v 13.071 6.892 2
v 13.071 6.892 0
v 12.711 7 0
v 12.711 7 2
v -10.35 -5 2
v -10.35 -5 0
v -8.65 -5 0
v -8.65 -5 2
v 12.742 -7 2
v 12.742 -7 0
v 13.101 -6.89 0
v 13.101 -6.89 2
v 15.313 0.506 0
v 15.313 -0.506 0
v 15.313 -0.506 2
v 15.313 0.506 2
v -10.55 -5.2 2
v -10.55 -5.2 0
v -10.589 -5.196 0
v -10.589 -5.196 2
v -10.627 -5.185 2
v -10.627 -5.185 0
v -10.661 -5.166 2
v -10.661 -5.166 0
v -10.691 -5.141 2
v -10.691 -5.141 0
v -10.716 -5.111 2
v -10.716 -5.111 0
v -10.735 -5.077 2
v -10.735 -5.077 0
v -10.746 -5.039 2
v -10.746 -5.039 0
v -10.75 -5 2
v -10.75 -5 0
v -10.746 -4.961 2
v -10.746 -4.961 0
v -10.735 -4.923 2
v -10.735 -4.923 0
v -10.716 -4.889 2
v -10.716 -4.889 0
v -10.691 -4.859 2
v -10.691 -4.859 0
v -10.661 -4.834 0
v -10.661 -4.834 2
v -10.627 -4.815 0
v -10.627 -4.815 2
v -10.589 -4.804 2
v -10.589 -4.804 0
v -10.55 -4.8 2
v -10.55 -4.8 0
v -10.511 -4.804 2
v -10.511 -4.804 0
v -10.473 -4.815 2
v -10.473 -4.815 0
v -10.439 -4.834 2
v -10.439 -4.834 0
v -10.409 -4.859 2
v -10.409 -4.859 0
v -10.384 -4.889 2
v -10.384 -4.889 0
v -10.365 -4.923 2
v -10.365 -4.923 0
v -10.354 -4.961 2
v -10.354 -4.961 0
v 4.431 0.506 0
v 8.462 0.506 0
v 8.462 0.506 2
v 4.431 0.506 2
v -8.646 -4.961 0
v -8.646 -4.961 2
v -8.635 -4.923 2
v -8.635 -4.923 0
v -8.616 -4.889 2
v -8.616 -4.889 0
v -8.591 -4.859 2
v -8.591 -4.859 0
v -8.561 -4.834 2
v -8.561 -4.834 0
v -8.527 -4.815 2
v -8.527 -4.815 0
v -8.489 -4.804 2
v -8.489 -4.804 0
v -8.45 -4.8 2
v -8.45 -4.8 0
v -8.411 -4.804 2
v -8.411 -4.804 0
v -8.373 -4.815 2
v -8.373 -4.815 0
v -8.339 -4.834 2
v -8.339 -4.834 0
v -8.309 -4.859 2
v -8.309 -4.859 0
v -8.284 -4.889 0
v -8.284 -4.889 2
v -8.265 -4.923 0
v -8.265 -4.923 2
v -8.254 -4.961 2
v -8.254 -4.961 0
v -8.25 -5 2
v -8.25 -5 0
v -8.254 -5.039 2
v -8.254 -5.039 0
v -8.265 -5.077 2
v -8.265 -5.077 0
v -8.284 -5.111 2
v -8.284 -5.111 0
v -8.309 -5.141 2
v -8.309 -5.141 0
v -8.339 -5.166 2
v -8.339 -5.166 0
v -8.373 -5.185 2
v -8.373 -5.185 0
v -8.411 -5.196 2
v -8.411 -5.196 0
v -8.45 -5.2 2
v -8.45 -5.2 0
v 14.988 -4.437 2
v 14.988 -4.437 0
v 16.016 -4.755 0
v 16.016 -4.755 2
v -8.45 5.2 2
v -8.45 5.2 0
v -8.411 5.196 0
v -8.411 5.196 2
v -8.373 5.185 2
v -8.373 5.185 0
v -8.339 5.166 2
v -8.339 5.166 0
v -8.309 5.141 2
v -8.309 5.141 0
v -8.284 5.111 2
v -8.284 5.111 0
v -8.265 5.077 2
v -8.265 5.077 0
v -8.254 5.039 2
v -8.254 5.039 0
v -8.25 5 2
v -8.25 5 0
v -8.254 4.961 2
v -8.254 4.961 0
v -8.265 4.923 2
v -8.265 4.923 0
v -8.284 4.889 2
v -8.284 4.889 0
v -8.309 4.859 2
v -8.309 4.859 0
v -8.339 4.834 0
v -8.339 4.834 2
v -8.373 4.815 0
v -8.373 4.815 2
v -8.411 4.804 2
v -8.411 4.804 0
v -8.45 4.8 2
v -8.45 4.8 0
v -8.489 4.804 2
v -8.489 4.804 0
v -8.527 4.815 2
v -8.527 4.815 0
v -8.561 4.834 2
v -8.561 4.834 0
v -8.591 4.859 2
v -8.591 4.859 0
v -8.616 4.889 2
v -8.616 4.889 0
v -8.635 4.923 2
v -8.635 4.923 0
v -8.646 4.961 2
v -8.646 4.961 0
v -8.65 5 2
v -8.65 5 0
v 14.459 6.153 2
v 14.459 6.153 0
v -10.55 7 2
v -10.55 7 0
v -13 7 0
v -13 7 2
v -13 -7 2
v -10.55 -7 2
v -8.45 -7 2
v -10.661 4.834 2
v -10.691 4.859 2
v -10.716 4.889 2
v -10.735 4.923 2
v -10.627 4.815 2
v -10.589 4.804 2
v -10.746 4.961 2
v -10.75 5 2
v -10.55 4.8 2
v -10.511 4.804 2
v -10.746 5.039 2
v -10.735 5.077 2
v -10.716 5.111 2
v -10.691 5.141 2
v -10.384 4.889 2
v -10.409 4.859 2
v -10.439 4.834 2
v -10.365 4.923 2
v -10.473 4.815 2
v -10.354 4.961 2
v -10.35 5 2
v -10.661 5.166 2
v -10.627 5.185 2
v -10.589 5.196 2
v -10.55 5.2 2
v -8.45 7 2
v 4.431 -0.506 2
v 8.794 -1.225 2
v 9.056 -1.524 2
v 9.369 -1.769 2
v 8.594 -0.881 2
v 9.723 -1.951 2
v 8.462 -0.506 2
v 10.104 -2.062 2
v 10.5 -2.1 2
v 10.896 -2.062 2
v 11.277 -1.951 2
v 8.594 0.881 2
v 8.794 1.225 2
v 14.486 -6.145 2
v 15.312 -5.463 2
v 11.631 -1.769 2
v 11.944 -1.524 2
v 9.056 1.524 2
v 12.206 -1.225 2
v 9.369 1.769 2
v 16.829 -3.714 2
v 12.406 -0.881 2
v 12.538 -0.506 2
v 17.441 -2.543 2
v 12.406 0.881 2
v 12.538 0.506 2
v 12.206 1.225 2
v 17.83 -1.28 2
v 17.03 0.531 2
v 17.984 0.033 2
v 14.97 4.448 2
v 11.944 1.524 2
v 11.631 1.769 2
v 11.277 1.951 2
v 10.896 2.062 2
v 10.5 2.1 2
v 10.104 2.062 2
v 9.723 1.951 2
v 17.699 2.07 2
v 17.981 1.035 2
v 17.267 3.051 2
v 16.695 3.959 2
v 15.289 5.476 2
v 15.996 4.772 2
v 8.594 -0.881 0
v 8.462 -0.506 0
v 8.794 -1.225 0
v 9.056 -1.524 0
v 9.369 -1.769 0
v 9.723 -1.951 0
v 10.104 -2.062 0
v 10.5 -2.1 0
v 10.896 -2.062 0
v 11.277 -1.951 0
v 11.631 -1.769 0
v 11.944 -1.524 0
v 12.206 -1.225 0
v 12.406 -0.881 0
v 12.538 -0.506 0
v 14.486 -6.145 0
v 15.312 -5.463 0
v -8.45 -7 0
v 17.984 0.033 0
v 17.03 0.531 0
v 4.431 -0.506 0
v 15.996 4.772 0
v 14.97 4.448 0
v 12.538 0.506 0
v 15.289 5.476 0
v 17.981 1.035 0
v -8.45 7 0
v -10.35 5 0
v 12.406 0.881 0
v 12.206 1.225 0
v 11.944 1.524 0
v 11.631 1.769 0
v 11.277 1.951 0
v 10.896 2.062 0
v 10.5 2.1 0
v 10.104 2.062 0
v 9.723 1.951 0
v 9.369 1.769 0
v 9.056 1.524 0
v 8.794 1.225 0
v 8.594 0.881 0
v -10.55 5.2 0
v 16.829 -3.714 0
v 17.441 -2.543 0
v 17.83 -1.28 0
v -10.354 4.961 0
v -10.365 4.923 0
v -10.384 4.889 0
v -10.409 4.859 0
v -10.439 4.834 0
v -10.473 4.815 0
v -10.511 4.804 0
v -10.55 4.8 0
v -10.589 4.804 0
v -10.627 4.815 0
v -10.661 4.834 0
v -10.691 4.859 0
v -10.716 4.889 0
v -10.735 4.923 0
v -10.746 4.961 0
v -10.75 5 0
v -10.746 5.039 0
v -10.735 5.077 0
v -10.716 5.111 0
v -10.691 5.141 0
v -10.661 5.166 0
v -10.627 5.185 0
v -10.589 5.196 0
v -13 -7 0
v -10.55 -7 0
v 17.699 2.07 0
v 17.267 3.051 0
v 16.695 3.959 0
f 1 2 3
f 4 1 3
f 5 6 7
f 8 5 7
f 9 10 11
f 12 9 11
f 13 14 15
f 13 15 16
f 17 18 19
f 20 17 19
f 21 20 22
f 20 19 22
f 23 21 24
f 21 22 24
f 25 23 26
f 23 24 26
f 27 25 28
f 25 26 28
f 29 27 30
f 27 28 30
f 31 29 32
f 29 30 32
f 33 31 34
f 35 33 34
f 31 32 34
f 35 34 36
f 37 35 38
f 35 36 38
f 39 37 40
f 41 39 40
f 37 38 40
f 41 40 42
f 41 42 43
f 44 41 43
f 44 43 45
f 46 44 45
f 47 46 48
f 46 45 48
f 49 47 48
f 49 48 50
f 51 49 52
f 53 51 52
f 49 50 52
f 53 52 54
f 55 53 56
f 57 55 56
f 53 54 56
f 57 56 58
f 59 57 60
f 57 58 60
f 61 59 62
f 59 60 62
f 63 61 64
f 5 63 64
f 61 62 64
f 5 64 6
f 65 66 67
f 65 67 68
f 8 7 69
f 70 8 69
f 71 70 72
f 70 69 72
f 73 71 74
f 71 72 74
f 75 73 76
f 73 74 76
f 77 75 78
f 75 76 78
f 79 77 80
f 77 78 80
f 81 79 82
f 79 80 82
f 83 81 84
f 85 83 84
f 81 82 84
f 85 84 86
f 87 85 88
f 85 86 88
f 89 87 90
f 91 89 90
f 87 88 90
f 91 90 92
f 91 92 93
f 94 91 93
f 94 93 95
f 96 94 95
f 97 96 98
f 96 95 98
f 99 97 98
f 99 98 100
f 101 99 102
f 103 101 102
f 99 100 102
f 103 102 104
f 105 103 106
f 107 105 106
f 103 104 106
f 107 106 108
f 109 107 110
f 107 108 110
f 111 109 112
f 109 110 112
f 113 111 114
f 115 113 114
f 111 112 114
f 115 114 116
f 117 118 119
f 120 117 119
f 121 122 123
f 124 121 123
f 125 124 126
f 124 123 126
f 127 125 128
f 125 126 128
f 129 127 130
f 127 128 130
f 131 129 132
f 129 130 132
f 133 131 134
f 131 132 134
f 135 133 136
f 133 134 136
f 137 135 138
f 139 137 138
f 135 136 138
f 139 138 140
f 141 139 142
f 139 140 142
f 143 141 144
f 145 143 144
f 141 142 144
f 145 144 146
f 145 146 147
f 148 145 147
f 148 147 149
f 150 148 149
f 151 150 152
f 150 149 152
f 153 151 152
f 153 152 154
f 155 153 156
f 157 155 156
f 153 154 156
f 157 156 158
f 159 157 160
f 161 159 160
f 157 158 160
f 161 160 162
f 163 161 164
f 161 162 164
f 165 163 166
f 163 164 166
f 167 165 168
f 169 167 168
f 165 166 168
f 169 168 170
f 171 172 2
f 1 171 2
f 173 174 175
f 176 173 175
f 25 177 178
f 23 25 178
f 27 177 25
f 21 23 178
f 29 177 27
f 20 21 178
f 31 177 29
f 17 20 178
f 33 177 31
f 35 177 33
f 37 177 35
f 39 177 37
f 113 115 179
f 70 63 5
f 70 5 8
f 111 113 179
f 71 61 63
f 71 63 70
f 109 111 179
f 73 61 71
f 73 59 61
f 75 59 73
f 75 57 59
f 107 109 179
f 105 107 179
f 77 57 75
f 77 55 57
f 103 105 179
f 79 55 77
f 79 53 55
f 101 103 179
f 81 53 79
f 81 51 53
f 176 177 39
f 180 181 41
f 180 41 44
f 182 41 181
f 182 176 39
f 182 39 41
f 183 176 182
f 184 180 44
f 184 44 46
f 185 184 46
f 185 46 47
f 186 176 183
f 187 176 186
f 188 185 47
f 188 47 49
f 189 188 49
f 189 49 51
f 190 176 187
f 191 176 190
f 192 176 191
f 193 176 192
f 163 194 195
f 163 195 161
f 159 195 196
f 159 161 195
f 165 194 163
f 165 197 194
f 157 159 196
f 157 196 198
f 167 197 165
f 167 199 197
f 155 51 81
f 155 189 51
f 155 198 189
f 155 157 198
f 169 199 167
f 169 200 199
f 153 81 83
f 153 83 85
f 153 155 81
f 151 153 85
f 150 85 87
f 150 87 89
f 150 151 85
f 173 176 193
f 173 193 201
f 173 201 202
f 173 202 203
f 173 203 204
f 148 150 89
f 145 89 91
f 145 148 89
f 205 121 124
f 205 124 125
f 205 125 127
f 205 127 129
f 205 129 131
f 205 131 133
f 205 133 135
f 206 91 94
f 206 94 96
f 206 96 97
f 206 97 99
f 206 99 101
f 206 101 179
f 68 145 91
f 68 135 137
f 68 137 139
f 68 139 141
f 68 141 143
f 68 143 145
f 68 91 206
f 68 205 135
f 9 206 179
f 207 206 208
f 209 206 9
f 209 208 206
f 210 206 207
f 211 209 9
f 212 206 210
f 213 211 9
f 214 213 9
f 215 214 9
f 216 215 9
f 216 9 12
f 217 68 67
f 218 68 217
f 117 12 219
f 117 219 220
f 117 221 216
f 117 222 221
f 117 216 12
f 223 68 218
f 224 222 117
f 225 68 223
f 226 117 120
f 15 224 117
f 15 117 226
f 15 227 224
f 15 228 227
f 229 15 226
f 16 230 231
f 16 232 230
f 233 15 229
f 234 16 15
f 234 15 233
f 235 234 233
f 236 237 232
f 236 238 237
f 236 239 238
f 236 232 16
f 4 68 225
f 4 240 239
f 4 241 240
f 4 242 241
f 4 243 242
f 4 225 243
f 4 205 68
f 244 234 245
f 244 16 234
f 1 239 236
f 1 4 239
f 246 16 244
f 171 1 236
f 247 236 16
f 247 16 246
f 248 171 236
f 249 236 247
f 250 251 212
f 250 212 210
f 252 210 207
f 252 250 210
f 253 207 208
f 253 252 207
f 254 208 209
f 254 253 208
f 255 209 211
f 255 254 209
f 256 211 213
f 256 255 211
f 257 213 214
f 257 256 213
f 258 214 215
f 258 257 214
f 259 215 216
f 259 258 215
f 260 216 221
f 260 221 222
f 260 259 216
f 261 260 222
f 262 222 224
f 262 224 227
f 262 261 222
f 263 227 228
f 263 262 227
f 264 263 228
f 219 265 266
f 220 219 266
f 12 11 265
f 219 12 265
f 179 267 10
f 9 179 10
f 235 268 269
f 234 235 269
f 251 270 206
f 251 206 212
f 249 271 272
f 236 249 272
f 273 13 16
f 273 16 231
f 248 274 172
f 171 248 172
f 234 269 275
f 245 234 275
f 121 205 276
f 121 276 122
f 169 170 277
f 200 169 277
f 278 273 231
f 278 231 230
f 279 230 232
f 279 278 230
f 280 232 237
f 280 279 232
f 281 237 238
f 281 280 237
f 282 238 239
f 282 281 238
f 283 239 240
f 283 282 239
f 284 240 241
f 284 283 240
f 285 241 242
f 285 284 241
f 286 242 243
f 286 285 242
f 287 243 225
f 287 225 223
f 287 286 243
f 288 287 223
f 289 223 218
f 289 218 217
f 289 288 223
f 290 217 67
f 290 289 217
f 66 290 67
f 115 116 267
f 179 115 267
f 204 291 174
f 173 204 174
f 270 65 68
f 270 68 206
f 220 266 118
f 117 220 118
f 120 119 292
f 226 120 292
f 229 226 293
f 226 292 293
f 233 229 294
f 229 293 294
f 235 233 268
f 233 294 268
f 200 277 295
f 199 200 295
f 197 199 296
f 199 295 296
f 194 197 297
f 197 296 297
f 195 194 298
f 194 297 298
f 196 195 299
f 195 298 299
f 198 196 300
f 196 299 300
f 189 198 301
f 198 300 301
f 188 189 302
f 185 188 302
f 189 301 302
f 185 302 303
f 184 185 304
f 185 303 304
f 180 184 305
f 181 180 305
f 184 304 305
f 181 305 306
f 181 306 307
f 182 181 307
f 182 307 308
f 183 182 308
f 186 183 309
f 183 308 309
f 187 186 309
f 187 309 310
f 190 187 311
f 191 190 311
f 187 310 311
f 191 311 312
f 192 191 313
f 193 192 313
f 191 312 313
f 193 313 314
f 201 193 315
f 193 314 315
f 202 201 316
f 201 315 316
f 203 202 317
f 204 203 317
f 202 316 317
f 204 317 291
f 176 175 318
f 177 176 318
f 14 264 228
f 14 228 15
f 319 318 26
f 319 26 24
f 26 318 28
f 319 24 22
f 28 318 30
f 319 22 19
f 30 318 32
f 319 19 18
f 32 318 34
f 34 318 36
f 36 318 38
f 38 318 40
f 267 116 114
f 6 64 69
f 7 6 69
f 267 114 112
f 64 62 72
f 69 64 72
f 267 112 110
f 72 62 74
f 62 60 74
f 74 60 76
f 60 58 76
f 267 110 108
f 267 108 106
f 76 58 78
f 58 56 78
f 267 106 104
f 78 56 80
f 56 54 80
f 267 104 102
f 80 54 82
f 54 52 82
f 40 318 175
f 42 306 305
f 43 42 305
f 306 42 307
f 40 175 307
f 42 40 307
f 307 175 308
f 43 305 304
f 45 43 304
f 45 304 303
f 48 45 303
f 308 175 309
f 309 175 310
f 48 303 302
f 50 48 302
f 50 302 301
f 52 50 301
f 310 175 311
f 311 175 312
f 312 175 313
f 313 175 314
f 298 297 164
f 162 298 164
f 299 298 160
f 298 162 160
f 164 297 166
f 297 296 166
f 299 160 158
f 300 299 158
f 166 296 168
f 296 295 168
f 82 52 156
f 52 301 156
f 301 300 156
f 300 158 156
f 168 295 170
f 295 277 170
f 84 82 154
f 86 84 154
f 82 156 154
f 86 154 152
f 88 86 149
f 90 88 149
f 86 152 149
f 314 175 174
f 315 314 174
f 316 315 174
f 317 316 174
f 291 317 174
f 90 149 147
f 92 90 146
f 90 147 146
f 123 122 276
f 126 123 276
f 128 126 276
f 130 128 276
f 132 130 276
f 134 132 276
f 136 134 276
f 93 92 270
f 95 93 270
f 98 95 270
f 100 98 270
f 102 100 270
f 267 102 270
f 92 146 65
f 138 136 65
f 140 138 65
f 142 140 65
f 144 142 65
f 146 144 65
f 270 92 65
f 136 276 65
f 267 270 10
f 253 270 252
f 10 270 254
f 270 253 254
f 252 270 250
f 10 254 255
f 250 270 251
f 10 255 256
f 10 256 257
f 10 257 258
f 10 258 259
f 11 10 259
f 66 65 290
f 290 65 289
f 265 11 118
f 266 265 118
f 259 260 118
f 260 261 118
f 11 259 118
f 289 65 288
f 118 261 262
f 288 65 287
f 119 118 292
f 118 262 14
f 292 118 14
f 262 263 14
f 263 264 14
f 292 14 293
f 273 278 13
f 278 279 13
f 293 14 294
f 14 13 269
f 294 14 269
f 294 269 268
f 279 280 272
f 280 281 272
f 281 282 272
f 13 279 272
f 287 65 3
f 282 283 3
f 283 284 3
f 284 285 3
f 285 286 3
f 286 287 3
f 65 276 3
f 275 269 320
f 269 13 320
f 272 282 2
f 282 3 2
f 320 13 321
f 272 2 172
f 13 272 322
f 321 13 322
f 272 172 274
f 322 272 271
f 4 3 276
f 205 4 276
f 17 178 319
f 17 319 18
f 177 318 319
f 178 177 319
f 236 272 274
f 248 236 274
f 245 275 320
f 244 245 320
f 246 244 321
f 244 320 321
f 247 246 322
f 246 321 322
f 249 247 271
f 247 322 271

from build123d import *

# Parameters (mm, degrees)
EXTRUDE_1_DEPTH = 2


with BuildPart() as part:
    # 草图1 → 凸台-拉伸1 (new body)
    with BuildSketch(Plane.XY):
        with BuildLine():
            Line((-8.45, -5.2), (-8.45, -7))
            Line((-8.45, -7), (12.741644056, -7))
            Line((12.741644056, -7), (13.101478198, -6.889754544))
            Line((13.101478198, -6.889754544), (14.486104816, -6.144709151))
            Line((14.486104816, -6.144709151), (15.312149212, -5.46294768))
            Line((15.312149212, -5.46294768), (14.987866566, -4.436878246))
            Line((14.987866566, -4.436878246), (16.015719748, -4.755461916))
            ThreePointArc((16.015719748, -4.755461916), (17.441105489, -2.542698595), (17.984281104, 0.032763748))
            Line((17.984281104, 0.032763748), (17.029669504, 0.531416269))
            Line((17.029669504, 0.531416269), (17.981499226, 1.035358552))
            ThreePointArc((17.981499226, 1.035358552), (17.266800727, 3.051396039), (15.995852657, 4.771829734))
            Line((15.995852657, 4.771829734), (14.969602225, 4.448120344))
            Line((14.969602225, 4.448120344), (15.288760048, 5.475795391))
            Line((15.288760048, 5.475795391), (14.459323359, 6.1534255))
            Line((14.459323359, 6.1534255), (13.070995905, 6.891551848))
            Line((13.070995905, 6.891551848), (12.710615967, 7))
            Line((12.710615967, 7), (-8.45, 7))
            Line((-8.45, 7), (-8.45, 5.2))
            ThreePointArc((-8.45, 5.2), (-8.308578644, 4.858578644), (-8.65, 5))
            Line((-8.65, 5), (-10.35, 5))
            ThreePointArc((-10.35, 5), (-10.691421356, 4.858578644), (-10.55, 5.2))
            Line((-10.55, 5.2), (-10.55, 7))
            Line((-10.55, 7), (-13, 7))
            Line((-13, 7), (-13, -7))
            Line((-13, -7), (-10.55, -7))
            Line((-10.55, -7), (-10.55, -5.2))
            ThreePointArc((-10.55, -5.2), (-10.691421356, -4.858578644), (-10.35, -5))
            Line((-10.35, -5), (-8.65, -5))
            ThreePointArc((-8.65, -5), (-8.308578644, -4.858578644), (-8.45, -5.2))
        make_face()
        with BuildLine():
            Line((8.461894687, 0.50608965), (4.430504753, 0.50608965))
            Line((4.430504753, 0.50608965), (4.430504753, -0.50608965))
            Line((4.430504753, -0.50608965), (8.461894687, -0.50608965))
            ThreePointArc((8.461894687, -0.50608965), (10.5, -2.1), (12.538105313, -0.50608965))
            Line((12.538105313, -0.50608965), (15.313201547, -0.50608965))
            Line((15.313201547, -0.50608965), (15.313201547, 0.50608965))
            Line((15.313201547, 0.50608965), (12.538105313, 0.50608965))
            ThreePointArc((12.538105313, 0.50608965), (10.5, 2.1), (8.461894687, 0.50608965))
        make_face(mode=Mode.SUBTRACT)
    extrude(amount=EXTRUDE_1_DEPTH)


solid = part.part
